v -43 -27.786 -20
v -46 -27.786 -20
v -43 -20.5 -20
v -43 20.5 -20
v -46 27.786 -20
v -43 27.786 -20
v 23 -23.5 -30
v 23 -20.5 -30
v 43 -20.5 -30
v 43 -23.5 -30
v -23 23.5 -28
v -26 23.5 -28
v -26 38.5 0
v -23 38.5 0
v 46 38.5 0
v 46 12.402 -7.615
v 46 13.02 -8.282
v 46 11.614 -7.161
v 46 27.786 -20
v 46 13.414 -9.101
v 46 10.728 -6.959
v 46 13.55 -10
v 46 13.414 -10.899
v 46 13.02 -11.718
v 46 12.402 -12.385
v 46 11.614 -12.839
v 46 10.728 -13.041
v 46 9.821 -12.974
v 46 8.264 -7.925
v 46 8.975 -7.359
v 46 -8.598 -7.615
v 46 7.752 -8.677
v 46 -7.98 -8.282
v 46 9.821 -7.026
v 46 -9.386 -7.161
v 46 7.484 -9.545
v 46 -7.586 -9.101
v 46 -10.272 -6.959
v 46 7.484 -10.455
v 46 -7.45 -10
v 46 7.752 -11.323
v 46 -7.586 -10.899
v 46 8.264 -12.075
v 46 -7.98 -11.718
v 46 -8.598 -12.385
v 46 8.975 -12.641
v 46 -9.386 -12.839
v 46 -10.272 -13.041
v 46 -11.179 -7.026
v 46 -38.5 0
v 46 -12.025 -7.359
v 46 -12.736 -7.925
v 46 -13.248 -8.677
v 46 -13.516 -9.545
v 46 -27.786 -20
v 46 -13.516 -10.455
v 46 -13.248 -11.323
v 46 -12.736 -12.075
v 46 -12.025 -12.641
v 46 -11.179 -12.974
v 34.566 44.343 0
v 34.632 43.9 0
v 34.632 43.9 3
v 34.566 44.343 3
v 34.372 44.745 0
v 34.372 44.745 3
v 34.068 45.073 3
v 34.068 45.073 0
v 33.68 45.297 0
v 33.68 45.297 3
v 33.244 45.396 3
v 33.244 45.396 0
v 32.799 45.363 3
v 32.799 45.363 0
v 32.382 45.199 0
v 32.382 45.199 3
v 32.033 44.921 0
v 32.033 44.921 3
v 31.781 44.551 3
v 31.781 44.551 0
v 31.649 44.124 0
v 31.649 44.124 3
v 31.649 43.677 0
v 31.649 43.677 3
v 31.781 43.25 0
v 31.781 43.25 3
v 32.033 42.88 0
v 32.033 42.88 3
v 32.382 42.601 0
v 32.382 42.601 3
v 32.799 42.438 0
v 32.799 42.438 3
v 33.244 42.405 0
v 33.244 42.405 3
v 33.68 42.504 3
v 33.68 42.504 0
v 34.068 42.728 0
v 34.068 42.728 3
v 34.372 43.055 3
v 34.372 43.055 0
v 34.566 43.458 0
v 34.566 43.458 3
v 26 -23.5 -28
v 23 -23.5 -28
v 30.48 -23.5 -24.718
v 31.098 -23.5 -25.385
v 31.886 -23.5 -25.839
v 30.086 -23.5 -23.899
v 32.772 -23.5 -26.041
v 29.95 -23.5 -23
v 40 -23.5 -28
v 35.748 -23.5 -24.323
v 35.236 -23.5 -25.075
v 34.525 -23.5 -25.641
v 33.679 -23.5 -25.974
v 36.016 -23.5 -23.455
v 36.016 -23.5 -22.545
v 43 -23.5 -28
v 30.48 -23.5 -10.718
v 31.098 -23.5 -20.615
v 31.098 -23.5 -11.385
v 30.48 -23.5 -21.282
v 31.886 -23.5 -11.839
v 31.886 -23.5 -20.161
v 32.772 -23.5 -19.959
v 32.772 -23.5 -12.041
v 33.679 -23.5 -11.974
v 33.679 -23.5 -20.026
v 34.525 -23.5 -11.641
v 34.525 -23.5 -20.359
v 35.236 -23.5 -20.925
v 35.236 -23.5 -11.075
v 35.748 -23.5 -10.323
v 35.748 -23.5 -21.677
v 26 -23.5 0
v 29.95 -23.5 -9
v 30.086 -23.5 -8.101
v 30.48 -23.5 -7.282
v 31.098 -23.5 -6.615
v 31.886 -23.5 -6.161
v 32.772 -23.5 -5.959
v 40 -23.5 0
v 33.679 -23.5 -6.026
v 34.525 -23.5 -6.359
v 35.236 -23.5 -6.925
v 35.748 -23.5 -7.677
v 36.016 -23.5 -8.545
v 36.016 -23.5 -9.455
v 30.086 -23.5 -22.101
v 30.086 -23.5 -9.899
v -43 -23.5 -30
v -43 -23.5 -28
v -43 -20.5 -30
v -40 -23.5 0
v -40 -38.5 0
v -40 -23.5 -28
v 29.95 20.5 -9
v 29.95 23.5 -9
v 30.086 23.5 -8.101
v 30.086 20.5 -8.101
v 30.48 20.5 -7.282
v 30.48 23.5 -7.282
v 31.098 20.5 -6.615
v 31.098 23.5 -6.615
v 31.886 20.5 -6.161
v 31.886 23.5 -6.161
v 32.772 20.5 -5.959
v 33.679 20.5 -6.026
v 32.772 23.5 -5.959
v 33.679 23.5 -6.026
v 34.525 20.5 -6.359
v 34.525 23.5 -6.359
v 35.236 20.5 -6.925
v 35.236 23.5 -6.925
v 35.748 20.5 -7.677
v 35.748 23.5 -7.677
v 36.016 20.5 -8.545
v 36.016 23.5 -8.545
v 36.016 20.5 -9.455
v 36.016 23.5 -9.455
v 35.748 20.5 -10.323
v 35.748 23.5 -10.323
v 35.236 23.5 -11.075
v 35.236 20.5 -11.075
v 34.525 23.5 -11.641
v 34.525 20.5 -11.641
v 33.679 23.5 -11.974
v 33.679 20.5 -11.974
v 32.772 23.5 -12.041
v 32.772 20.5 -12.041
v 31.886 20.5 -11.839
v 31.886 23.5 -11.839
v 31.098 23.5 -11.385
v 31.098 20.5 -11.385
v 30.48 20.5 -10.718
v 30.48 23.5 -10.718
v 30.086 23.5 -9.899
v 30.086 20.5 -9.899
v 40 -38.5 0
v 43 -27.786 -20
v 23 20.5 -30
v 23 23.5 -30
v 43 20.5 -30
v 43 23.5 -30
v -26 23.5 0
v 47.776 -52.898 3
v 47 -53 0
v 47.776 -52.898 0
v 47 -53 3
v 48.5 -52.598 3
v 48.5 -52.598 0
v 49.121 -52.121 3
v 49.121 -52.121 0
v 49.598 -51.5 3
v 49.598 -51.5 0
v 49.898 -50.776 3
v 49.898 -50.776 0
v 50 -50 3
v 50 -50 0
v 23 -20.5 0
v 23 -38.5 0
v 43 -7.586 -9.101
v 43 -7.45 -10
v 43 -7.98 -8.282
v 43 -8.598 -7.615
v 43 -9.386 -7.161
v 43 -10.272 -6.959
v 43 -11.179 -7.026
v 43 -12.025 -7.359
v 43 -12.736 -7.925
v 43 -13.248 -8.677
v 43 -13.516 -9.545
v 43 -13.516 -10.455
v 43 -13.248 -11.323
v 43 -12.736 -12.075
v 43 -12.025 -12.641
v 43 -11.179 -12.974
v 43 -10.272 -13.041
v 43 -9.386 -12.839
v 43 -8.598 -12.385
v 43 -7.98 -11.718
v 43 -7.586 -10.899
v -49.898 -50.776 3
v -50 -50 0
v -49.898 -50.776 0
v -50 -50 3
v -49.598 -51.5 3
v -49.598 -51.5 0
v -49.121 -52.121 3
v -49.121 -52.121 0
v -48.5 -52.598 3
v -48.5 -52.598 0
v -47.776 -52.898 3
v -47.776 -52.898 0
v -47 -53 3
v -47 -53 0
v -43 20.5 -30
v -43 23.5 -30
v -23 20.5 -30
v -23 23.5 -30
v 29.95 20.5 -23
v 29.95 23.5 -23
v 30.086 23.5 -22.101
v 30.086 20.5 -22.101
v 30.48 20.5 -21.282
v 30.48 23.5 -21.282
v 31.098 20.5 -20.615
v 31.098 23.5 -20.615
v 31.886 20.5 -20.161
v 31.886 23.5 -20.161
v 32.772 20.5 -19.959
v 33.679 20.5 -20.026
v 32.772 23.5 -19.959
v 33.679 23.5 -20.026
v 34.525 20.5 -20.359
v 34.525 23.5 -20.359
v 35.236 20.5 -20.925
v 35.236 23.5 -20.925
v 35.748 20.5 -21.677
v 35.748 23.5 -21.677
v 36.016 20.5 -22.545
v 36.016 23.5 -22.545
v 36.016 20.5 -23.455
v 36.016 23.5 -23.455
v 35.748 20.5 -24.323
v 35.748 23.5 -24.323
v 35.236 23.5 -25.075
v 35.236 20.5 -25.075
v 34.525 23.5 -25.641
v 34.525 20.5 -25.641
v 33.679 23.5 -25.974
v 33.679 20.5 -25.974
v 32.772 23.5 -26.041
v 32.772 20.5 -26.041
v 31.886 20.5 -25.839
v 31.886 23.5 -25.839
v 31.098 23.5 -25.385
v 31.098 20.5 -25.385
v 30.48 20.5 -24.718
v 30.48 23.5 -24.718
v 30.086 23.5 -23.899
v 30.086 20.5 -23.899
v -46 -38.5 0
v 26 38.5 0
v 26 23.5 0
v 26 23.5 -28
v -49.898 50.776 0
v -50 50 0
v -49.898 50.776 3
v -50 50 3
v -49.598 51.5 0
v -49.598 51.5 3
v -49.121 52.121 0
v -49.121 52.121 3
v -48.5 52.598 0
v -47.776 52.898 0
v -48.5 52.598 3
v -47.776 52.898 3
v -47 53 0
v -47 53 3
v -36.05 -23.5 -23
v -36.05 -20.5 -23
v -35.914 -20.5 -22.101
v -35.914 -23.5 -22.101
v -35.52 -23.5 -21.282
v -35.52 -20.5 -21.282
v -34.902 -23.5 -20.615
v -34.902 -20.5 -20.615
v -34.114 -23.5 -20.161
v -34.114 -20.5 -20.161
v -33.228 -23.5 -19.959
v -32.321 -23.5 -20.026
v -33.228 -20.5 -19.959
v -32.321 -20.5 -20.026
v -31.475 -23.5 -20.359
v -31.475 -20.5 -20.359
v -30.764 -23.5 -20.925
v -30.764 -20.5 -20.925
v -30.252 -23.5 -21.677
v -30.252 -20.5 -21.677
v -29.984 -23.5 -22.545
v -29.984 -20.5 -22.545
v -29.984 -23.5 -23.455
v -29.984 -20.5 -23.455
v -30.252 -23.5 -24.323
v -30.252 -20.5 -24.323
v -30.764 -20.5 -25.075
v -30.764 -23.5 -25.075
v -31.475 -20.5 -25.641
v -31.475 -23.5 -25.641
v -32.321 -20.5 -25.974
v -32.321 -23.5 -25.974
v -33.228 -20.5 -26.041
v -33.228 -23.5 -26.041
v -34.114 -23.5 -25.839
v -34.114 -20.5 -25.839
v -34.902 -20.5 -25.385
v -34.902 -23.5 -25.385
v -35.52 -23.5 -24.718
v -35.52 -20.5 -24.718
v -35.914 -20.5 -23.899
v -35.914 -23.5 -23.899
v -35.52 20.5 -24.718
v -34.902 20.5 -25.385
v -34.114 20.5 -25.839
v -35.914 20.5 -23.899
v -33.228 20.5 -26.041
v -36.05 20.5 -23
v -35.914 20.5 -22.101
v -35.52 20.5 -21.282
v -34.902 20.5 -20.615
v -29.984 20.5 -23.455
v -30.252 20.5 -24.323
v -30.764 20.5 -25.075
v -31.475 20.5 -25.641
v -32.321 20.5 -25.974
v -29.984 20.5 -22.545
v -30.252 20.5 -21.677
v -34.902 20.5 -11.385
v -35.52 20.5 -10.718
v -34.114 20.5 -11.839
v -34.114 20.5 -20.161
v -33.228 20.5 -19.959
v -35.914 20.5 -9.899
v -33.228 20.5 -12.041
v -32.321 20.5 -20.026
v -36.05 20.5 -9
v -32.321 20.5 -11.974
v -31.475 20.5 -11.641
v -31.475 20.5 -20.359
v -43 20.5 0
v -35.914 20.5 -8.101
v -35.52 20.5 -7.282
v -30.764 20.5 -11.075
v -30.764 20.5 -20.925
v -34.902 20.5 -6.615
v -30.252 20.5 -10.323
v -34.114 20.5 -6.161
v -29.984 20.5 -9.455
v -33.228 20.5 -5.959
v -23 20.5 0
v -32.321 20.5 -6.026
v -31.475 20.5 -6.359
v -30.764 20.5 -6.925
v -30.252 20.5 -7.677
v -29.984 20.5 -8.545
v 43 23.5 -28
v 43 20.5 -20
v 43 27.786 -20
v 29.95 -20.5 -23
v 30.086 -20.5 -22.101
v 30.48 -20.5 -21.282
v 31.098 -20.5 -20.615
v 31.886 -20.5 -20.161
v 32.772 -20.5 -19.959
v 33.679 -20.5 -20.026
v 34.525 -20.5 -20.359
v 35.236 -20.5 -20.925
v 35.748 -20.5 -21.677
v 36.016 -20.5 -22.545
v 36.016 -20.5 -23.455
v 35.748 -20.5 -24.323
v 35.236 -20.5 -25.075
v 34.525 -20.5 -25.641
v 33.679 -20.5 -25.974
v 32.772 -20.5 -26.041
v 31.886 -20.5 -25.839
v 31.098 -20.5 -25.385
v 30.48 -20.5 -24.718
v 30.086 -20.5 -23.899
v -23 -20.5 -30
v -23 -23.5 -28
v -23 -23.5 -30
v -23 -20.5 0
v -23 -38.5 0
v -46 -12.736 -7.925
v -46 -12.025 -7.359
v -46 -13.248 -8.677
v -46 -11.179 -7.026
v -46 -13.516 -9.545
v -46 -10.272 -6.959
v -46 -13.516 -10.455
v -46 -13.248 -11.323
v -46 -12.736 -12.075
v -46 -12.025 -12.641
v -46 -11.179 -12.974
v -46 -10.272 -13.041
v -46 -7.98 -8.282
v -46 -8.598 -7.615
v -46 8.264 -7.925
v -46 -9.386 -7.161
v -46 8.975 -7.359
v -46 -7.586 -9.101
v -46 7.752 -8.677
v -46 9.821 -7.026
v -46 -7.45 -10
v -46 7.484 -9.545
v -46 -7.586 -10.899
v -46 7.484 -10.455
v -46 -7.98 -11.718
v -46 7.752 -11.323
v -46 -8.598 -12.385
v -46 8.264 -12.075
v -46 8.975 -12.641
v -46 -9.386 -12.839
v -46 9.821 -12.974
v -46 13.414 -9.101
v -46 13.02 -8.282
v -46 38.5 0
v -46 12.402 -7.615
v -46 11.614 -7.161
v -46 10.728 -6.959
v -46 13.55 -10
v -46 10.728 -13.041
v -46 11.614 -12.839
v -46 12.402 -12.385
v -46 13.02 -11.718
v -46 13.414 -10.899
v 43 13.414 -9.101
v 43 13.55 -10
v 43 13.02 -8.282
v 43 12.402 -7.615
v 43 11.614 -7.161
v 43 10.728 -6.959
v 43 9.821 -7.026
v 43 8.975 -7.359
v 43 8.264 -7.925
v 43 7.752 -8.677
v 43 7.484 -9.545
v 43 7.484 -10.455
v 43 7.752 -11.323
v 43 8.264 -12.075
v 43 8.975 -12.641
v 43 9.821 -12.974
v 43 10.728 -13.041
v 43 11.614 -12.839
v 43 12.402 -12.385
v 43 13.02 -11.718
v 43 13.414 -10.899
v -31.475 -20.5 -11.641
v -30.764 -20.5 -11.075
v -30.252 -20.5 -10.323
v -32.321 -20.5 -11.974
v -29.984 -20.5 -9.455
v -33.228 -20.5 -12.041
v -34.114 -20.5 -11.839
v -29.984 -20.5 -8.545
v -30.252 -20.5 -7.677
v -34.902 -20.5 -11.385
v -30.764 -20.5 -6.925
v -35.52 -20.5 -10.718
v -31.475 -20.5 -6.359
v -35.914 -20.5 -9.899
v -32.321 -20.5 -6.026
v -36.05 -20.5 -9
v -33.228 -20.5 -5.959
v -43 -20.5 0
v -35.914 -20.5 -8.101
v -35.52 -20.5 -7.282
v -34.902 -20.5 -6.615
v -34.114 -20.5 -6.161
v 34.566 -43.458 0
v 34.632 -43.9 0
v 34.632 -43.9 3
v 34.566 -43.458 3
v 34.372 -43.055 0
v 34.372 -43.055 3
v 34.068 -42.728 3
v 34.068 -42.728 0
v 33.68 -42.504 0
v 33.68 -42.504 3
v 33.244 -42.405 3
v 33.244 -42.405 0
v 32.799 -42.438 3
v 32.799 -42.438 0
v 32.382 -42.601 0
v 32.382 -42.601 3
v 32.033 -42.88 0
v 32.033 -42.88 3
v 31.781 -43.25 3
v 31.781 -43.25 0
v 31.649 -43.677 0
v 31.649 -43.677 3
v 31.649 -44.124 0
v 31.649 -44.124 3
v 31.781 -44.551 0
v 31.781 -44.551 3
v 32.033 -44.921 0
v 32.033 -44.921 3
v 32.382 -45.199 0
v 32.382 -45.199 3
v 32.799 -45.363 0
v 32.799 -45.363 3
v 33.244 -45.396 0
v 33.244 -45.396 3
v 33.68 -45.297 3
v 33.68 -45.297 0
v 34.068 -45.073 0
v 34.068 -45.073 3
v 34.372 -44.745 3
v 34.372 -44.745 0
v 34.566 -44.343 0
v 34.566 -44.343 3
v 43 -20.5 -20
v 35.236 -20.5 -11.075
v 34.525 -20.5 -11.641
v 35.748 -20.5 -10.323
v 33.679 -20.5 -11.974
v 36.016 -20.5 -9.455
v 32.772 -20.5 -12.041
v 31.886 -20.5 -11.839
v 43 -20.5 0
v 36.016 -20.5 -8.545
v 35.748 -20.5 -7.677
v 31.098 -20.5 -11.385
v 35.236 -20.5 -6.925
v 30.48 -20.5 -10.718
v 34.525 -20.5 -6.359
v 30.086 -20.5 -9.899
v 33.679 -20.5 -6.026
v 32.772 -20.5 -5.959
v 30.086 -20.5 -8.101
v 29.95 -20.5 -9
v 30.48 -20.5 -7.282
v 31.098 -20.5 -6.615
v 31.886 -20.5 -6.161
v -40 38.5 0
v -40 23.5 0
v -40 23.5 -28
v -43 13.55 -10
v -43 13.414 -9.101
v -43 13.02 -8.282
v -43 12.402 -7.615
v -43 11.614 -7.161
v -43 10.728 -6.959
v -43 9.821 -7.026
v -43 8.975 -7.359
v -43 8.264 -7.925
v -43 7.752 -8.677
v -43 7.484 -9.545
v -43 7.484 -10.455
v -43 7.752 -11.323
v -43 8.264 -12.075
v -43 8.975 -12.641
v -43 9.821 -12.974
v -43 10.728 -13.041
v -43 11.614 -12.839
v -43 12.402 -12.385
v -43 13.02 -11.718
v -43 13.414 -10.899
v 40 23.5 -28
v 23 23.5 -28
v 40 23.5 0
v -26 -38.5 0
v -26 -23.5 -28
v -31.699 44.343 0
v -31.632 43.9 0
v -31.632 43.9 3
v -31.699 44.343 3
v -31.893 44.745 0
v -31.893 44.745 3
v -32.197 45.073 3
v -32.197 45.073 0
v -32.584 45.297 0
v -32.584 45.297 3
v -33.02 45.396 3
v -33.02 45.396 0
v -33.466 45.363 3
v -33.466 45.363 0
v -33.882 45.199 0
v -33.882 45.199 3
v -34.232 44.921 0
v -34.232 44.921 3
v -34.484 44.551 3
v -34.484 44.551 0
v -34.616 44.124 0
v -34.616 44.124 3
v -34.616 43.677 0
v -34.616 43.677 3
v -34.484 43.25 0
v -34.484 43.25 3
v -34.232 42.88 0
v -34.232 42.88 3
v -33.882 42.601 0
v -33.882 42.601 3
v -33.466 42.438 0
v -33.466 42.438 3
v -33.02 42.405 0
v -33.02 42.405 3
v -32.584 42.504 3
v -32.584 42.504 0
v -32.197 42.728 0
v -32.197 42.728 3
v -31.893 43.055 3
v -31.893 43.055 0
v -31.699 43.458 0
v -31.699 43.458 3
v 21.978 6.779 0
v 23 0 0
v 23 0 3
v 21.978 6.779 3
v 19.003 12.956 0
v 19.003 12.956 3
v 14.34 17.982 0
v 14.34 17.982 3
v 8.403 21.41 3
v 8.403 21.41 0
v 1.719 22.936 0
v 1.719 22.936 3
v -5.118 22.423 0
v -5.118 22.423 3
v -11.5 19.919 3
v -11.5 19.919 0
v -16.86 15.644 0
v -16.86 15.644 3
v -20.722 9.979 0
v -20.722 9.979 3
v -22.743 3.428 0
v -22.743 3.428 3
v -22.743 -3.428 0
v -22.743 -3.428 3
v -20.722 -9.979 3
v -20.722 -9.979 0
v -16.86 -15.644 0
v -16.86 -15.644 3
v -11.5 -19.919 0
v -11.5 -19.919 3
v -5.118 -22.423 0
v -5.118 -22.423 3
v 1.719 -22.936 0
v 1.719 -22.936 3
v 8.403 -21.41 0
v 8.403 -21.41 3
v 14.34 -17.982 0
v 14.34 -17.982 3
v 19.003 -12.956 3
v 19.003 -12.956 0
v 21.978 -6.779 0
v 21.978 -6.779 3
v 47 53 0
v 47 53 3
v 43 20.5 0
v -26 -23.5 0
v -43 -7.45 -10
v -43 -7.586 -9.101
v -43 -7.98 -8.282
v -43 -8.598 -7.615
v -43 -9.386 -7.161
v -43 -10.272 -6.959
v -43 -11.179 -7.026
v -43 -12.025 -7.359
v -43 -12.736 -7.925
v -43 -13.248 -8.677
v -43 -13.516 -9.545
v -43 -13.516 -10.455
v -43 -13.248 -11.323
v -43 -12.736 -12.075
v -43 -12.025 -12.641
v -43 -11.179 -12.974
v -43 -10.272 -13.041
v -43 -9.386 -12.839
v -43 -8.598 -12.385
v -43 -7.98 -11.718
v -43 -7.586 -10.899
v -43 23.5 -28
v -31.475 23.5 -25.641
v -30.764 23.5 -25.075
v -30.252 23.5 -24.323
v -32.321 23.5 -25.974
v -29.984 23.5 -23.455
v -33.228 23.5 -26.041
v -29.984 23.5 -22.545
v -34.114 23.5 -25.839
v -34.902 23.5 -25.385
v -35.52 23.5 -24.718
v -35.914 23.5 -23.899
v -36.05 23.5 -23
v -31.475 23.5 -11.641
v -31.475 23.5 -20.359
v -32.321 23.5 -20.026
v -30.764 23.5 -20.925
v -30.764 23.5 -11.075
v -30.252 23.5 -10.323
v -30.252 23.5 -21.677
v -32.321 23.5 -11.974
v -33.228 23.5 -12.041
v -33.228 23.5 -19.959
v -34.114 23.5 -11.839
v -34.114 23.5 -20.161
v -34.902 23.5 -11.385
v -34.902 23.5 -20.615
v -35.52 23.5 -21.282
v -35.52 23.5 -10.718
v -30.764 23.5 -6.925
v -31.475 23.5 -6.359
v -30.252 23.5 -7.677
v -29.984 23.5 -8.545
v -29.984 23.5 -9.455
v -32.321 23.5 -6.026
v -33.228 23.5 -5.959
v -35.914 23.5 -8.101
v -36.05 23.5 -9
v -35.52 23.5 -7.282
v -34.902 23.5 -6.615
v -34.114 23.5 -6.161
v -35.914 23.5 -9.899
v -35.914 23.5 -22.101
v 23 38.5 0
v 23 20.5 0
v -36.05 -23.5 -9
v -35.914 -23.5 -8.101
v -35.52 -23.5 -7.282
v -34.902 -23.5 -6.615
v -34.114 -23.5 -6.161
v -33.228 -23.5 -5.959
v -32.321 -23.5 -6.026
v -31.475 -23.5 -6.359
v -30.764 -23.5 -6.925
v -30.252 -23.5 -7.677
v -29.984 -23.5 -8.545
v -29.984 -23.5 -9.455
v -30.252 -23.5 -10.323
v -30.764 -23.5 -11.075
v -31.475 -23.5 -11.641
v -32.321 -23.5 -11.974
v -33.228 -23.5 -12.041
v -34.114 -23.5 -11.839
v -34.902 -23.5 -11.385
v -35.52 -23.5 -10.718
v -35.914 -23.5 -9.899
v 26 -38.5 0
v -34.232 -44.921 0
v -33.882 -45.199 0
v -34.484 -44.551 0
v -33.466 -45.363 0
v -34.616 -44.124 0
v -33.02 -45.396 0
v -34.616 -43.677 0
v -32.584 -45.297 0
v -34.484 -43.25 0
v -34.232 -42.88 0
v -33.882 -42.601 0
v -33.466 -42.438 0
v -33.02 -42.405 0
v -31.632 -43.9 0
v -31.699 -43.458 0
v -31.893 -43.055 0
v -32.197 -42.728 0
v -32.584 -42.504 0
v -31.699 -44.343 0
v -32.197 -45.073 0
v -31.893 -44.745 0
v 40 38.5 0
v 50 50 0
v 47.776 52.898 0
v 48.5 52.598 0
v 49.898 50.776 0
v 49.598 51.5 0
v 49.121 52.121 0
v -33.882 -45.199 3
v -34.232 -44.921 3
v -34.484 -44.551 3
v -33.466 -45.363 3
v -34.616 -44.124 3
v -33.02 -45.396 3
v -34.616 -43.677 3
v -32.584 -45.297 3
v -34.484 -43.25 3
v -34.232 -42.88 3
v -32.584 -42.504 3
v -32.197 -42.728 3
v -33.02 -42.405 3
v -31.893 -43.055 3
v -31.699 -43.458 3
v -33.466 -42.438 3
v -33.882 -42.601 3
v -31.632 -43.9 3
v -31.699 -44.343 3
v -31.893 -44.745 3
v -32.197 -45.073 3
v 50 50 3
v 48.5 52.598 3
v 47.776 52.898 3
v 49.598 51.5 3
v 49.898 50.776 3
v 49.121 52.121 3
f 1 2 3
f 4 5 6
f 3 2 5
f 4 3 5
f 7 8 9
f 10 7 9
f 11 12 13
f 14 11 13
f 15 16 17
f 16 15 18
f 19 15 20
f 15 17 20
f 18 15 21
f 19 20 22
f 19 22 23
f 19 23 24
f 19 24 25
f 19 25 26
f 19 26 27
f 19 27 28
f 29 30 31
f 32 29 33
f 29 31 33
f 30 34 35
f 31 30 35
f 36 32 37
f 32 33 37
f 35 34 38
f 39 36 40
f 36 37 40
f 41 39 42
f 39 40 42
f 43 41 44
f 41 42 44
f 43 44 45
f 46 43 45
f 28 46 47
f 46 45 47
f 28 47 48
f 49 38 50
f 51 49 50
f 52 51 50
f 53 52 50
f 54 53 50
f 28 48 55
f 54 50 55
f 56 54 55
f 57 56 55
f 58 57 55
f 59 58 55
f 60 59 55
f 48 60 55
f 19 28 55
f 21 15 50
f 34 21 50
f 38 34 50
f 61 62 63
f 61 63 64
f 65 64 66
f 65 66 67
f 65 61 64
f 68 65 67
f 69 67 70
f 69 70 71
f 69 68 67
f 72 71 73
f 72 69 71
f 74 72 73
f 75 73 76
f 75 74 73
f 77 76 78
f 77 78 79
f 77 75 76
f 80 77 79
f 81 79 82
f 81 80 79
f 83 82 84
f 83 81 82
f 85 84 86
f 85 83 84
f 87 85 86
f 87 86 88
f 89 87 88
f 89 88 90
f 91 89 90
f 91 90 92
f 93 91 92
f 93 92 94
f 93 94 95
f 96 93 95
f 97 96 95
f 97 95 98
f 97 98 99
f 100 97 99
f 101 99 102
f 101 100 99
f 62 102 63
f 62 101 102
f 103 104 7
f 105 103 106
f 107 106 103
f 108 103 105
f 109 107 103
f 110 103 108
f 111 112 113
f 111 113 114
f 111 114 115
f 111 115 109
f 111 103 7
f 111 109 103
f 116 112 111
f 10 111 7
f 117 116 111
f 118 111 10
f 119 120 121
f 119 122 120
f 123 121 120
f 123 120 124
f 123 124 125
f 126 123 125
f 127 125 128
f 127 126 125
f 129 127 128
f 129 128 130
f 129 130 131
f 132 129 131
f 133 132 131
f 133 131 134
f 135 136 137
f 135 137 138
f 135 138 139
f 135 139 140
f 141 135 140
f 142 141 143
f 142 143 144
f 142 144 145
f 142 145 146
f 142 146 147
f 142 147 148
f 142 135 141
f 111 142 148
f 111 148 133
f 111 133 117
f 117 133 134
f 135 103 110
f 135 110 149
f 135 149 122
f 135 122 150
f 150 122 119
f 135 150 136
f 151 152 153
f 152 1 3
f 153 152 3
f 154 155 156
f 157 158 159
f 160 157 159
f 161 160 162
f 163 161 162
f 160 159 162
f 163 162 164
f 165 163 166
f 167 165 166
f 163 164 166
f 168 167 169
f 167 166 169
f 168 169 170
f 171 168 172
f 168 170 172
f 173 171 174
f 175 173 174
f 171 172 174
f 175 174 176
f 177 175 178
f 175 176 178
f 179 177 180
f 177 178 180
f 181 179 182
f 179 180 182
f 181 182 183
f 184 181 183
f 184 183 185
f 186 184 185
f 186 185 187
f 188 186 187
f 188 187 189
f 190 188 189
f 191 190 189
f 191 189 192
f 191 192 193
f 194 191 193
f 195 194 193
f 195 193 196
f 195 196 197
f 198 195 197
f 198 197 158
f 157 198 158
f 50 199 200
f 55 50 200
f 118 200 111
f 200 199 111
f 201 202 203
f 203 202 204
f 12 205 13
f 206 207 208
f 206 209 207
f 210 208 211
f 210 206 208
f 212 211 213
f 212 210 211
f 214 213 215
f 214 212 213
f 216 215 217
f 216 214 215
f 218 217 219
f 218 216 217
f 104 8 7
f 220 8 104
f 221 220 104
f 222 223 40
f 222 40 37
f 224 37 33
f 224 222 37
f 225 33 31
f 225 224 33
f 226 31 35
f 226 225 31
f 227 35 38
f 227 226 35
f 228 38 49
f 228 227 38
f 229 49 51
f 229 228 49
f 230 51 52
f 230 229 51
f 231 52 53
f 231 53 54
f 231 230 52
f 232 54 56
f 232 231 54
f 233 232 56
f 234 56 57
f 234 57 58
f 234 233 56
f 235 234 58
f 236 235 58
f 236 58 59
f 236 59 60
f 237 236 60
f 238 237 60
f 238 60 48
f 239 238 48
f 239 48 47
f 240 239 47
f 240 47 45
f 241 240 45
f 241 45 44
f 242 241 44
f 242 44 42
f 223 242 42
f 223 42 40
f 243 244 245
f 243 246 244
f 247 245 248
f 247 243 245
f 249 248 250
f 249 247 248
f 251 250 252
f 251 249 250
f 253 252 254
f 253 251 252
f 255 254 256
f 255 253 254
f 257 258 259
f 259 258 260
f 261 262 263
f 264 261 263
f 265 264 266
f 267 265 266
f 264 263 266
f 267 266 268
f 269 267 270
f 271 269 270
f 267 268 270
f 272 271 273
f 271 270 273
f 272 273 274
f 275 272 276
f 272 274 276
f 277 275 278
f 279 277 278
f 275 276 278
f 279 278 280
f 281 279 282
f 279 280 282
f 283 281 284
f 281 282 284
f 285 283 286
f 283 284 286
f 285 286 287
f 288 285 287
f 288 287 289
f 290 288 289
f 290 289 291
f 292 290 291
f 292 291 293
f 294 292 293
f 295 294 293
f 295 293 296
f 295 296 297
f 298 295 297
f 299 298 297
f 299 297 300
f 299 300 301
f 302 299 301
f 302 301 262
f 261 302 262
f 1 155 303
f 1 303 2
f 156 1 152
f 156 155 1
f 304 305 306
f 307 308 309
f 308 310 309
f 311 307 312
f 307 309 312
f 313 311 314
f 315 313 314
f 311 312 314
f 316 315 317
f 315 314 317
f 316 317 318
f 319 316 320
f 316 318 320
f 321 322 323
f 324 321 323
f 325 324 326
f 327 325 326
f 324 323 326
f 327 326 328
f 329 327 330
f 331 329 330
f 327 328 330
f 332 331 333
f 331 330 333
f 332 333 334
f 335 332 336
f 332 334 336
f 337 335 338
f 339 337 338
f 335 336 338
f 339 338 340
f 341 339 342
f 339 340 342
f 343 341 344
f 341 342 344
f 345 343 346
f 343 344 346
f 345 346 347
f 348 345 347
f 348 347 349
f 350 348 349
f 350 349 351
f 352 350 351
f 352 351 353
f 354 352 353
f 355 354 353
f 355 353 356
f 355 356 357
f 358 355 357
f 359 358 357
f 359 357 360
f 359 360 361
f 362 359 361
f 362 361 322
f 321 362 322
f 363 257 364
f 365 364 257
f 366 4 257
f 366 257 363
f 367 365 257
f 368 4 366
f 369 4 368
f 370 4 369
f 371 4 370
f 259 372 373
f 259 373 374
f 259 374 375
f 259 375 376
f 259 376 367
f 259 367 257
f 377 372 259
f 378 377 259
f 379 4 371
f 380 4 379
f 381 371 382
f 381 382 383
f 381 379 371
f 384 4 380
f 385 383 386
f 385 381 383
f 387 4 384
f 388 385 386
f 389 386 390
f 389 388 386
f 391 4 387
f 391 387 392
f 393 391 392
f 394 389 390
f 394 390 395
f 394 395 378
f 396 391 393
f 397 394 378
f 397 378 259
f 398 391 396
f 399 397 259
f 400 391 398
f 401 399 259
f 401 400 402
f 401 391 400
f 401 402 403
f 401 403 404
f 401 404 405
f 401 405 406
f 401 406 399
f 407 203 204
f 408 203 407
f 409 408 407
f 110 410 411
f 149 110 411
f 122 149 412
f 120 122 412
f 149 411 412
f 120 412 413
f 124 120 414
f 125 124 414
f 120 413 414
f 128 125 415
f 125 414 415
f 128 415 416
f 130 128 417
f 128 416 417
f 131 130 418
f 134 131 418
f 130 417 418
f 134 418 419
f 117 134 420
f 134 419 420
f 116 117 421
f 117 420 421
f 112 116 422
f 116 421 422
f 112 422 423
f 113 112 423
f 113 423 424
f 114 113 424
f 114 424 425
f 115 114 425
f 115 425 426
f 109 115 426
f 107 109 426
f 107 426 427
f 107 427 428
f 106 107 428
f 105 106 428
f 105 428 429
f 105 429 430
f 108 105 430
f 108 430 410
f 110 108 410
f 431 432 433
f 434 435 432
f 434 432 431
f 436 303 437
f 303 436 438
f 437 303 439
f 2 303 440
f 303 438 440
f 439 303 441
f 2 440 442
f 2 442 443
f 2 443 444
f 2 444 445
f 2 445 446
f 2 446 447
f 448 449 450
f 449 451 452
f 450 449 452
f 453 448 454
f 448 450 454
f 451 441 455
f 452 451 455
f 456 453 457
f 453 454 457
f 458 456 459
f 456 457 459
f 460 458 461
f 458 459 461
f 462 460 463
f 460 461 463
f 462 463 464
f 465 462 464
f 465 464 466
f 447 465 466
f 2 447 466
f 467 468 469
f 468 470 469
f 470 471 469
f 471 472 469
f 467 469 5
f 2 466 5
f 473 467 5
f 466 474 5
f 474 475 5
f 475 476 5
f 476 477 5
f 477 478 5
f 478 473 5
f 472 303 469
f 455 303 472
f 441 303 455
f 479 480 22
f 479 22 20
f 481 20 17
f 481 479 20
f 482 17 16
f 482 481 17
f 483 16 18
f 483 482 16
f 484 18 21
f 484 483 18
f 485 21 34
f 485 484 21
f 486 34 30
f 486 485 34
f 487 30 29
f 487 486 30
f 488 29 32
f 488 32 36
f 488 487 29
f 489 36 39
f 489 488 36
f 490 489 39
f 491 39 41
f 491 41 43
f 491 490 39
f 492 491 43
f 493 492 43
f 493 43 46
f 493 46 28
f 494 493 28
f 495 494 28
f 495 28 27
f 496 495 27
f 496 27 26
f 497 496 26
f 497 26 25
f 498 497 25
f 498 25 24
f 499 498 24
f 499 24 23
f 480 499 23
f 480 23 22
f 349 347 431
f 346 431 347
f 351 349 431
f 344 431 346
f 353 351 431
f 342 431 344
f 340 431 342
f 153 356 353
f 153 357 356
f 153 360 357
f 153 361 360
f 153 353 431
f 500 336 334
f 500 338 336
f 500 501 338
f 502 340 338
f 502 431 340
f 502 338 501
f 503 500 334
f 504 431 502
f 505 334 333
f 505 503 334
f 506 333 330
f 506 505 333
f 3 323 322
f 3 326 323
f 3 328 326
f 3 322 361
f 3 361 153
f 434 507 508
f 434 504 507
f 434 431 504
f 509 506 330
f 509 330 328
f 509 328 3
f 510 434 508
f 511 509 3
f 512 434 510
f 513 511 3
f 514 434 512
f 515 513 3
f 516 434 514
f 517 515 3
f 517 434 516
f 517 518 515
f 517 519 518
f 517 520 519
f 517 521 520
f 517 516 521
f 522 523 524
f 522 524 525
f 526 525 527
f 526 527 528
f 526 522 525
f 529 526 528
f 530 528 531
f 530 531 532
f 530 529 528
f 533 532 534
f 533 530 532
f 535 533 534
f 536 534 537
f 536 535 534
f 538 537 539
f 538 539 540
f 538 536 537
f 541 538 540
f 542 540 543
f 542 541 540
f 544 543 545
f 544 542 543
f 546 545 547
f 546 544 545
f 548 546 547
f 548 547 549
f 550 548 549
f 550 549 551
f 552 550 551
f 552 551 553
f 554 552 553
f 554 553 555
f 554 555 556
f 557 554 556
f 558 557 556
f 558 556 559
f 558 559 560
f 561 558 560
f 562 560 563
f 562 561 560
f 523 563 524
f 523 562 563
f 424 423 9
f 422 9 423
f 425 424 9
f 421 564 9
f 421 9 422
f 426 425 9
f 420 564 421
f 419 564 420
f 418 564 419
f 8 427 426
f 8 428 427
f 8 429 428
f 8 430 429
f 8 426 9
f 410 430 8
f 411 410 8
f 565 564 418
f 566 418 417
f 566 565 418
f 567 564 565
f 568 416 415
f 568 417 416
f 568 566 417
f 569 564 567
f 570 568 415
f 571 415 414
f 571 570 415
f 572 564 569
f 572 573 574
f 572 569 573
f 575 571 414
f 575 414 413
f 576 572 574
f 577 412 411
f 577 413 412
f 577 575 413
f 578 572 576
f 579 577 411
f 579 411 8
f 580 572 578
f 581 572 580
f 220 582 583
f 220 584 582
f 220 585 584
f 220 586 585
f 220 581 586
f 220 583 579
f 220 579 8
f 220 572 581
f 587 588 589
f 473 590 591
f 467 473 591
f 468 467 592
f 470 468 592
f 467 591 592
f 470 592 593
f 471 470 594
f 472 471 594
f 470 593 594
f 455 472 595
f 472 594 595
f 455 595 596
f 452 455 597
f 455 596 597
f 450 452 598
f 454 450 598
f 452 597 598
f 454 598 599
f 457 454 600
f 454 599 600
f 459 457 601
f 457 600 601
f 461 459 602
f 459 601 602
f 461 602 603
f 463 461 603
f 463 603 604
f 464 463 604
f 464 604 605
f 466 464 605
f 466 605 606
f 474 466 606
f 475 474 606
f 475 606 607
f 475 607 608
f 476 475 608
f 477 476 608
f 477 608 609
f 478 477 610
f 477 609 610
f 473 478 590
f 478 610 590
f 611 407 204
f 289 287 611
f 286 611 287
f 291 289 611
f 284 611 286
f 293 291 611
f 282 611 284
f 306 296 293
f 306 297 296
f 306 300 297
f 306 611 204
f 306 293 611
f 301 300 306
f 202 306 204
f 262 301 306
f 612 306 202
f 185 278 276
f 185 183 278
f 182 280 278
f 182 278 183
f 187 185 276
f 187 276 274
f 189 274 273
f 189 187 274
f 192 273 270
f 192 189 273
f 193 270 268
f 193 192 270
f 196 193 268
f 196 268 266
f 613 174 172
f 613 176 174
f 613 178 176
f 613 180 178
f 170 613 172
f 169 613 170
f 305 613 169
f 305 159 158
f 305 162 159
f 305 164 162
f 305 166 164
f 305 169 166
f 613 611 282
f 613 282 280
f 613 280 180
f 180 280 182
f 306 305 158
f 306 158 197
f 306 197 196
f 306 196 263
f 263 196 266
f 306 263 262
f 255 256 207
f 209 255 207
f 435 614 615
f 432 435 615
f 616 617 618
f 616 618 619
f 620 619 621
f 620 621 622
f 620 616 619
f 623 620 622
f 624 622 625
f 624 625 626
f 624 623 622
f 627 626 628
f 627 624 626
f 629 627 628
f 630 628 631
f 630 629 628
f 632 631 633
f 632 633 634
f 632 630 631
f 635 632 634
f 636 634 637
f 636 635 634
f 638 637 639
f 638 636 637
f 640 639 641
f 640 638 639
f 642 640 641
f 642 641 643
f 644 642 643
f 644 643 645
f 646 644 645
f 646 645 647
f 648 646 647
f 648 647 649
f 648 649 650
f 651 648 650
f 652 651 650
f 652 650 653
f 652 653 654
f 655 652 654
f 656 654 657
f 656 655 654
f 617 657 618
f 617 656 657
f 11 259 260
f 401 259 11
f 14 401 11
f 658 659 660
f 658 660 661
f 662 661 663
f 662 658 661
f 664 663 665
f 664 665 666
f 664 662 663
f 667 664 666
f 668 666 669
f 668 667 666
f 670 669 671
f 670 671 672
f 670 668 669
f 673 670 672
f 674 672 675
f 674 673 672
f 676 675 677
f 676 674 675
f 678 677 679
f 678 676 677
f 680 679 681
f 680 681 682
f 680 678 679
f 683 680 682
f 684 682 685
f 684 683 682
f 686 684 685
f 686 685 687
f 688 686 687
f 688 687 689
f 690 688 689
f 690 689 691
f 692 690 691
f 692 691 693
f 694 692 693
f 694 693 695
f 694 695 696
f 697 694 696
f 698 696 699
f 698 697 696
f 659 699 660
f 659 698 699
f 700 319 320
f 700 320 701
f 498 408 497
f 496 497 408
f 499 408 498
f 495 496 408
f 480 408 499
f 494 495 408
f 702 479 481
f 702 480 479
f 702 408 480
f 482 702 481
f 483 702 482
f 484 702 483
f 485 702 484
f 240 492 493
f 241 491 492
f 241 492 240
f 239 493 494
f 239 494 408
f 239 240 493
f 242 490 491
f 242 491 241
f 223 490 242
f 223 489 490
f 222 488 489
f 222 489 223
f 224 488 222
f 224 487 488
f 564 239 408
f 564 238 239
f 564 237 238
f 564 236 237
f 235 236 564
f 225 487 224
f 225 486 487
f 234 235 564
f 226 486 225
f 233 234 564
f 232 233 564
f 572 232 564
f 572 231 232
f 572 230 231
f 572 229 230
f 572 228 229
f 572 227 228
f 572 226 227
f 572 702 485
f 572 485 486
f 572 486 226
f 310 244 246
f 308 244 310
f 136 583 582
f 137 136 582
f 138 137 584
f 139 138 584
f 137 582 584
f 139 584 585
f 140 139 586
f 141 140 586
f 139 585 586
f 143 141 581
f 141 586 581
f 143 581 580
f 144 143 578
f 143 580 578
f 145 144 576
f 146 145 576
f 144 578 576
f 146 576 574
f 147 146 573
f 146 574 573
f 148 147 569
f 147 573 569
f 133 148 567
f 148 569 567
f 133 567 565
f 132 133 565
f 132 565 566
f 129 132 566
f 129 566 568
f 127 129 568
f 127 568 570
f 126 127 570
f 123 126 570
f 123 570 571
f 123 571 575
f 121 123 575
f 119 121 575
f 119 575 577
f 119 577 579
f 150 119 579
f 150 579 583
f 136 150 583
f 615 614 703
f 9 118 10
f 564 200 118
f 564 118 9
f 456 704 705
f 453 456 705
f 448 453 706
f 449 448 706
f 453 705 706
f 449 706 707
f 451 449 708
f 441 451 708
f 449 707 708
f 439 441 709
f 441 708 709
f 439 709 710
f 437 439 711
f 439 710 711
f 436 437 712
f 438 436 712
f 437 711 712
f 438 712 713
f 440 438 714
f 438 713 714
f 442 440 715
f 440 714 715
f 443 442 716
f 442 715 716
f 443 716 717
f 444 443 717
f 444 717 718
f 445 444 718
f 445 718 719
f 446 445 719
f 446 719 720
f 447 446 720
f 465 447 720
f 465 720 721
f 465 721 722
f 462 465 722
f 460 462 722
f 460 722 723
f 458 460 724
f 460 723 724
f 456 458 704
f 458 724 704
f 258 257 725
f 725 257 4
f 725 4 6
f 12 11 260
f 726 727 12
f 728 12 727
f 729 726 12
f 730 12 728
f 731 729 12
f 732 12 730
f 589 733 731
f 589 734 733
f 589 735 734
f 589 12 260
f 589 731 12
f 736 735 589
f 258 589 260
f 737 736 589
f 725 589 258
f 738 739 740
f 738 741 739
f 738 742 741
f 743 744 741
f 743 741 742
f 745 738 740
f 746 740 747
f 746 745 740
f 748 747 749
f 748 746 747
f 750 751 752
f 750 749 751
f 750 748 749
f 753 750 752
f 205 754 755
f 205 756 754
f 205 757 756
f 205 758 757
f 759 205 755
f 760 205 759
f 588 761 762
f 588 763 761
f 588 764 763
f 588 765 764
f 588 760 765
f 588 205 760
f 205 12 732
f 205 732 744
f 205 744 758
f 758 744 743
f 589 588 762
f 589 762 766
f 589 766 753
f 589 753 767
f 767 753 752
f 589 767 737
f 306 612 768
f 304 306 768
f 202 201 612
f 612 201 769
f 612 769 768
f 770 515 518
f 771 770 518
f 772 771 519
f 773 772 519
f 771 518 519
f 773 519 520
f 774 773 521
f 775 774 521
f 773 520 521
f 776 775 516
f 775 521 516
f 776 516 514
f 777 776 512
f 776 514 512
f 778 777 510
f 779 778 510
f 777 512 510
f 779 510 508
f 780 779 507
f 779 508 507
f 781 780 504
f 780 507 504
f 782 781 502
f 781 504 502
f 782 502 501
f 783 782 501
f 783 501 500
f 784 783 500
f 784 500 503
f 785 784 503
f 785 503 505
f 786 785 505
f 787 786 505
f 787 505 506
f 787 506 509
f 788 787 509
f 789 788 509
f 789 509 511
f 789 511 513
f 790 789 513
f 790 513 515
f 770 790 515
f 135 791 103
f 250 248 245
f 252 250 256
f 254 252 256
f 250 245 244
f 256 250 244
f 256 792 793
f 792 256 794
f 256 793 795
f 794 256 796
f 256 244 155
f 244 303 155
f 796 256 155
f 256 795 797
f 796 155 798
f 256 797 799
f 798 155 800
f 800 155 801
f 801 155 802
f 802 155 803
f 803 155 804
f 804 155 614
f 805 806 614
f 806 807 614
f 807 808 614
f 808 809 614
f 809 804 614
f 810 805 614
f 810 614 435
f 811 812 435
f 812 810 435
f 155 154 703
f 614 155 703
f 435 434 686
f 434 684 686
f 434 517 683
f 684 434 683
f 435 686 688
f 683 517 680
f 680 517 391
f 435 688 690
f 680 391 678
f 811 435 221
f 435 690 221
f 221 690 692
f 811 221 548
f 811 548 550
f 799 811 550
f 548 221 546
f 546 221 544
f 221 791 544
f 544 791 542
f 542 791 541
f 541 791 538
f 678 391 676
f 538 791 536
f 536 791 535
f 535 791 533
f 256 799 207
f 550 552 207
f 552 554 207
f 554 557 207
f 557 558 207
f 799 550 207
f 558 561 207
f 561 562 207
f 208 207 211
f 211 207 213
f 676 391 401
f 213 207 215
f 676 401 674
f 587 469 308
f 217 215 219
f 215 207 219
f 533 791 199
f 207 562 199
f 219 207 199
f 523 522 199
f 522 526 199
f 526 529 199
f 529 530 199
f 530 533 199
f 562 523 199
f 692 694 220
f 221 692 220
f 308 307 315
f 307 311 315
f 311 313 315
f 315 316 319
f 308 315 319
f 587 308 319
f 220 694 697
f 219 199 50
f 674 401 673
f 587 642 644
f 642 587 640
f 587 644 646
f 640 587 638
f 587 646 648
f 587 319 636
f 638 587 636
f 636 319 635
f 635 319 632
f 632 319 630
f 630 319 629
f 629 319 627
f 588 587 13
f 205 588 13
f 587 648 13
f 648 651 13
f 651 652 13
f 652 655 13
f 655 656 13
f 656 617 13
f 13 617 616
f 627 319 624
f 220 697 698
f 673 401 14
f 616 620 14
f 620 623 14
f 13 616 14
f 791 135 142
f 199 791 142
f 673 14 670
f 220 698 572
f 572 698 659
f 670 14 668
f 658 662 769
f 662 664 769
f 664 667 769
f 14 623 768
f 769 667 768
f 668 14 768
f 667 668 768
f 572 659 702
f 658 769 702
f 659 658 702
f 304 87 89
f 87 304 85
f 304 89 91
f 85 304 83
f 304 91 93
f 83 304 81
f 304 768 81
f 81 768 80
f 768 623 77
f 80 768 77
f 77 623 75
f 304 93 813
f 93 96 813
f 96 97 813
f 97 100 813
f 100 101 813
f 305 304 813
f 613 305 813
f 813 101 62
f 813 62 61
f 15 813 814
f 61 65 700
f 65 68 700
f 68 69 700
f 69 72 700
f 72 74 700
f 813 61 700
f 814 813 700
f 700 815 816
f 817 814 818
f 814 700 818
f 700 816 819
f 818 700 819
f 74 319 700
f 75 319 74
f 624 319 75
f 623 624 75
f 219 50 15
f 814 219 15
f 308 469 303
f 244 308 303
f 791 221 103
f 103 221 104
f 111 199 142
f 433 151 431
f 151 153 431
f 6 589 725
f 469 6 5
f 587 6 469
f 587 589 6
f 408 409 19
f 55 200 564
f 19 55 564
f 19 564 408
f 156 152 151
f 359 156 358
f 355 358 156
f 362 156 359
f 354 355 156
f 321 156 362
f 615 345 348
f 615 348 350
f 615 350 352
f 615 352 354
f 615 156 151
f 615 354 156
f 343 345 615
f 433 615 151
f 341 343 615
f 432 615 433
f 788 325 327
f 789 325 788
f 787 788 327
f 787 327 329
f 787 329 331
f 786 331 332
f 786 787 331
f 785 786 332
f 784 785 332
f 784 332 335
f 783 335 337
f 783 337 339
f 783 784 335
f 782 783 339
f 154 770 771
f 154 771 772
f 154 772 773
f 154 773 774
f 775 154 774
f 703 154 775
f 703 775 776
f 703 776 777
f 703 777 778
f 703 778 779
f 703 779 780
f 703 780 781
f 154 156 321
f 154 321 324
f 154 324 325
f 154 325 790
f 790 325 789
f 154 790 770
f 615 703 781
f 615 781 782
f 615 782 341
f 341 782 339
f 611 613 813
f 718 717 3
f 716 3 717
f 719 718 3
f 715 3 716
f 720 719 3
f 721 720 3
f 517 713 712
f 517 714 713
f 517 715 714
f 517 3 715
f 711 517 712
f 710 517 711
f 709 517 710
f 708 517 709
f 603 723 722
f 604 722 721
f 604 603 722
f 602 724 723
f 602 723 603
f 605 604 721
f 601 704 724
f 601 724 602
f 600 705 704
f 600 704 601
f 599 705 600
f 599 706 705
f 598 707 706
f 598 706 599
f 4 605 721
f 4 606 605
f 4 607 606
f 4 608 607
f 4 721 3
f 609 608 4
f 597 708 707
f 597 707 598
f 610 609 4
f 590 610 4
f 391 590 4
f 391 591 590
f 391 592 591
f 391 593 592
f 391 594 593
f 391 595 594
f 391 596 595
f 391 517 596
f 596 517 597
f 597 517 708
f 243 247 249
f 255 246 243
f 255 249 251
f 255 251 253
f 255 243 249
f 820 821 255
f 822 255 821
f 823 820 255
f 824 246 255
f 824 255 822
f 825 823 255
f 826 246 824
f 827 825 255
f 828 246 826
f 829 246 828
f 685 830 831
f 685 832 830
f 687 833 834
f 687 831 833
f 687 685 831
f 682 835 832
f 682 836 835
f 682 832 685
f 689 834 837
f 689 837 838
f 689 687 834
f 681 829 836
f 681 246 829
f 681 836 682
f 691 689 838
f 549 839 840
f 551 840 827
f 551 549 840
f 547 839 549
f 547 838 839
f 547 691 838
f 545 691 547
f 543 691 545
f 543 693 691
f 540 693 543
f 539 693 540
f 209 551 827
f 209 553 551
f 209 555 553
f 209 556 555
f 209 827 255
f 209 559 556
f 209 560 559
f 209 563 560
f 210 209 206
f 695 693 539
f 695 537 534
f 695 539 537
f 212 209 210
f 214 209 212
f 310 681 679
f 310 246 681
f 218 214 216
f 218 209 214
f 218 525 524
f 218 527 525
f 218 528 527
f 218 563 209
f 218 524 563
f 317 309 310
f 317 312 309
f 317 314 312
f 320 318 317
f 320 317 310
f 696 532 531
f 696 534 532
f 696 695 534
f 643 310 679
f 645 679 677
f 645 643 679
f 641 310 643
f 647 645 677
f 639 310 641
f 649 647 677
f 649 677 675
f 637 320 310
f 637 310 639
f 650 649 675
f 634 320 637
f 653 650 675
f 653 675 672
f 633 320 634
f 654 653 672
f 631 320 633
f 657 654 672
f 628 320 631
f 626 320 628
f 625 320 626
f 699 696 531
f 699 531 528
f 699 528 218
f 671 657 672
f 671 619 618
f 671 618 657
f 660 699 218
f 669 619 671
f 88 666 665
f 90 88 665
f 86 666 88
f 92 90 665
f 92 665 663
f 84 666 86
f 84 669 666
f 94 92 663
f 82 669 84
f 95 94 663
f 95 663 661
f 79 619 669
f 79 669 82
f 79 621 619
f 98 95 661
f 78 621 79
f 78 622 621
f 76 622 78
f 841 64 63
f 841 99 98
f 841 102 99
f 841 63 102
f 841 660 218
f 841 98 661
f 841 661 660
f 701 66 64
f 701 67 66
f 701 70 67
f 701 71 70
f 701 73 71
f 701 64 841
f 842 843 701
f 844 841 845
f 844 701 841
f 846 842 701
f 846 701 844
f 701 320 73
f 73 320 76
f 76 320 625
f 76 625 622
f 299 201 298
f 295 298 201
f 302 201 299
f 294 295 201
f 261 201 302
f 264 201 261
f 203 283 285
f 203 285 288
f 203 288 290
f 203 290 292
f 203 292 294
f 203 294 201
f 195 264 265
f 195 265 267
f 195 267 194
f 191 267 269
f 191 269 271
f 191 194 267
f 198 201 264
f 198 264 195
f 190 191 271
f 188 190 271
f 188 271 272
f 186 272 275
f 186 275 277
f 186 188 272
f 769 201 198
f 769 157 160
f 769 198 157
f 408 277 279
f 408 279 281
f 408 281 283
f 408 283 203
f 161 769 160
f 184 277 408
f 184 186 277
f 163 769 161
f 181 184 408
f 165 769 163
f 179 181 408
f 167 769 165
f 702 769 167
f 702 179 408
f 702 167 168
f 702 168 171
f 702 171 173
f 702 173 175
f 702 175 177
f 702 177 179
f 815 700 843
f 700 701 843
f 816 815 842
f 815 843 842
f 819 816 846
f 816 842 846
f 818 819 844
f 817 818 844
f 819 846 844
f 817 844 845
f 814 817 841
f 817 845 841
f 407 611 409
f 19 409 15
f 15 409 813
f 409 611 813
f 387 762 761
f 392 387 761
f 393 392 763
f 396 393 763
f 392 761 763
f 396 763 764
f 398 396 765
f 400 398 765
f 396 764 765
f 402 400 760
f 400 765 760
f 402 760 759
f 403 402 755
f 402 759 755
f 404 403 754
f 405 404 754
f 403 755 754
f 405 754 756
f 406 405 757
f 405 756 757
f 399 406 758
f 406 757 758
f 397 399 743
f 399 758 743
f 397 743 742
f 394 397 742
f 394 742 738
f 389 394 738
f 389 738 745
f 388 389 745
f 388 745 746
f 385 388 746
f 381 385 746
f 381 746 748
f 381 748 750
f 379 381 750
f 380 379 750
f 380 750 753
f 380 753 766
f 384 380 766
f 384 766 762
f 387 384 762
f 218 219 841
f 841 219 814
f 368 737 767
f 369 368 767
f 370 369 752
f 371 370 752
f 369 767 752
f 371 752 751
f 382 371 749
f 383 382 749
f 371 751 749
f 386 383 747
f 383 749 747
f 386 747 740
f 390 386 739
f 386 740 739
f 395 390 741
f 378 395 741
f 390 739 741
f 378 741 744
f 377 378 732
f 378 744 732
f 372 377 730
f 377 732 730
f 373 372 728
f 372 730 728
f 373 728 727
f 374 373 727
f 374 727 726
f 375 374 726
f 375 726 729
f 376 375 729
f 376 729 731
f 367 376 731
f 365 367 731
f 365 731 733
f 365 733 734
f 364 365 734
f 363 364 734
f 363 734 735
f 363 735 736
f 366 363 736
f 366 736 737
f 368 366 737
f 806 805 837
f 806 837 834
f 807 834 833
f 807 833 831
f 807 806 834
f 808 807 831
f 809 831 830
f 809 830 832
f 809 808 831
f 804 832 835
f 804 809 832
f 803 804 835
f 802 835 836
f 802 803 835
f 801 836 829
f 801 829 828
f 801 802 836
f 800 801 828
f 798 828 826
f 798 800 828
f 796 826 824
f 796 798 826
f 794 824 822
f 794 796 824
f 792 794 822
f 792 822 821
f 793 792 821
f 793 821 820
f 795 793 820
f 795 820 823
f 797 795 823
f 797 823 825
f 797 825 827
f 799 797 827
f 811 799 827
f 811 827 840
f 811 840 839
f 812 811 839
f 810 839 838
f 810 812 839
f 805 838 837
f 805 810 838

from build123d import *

# Parameters (mm, degrees)
F0_W           = 100
F0_H           = 106
F0_R           = 1.5
F0_R_2         = 23
F1_DEPTH       = 3
F2_R           = 3
F4_DEPTH       = 28
F5_DEPTH       = 20
F3_W           = 3
F3_H           = 15
F6_DEPTH       = 28
F7_DEPTH       = 15
F7_DEPTH_BACK  = 62
F9_DEPTH       = 20
F9_DEPTH_BACK  = 72
F11_DEPTH      = 20
F11_DEPTH_BACK = 72
F12_R          = 3.05
F13_R          = 3.05
F14_DEPTH      = 47
F15_R          = 3.05
F16_DEPTH      = 3
F16_DEPTH_BACK = 89
F17_DEPTH      = 2


with BuildPart() as f1:
    # F0 (on Top) → F1 (new body)
    with BuildSketch(Plane.XY):
        Rectangle(F0_W, F0_H)
        with Locations((-33.1323798252, -43.9004032683)):
            Circle(F0_R, mode=Mode.SUBTRACT)
        with Locations((33.1323798252, -43.9004032683)):
            Circle(F0_R, mode=Mode.SUBTRACT)
        with Locations((-33.1323798252, 43.9004032683)):
            Circle(F0_R, mode=Mode.SUBTRACT)
        Circle(F0_R_2, mode=Mode.SUBTRACT)
        with Locations((33.1323798252, 43.9004032683)):
            Circle(F0_R, mode=Mode.SUBTRACT)
    extrude(amount=F1_DEPTH)

    # F2
    f2_edges = [f1.edges().sort_by_distance(p)[0] for p in [
        (-50, -53, 1.5),
        (-50, 53, 1.5),
        (50, 53, 1.5),
        (50, -53, 1.5),
    ]]
    fillet(f2_edges, radius=F2_R)

    # F3 (on Top) → F4 (join)
    with BuildSketch(Plane.XY):
        Polygon((-23, -20.5), (-43, -20.5), (-43, -23.5), (-40, -23.5), (-26, -23.5), (-23, -23.5), align=None)
        Polygon((-43, 23.5), (-43, 20.5), (-23, 20.5), (-23, 23.5), (-26, 23.5), (-40, 23.5), align=None)
        Polygon((23, 20.5), (43, 20.5), (43, 23.5), (40, 23.5), (26, 23.5), (23, 23.5), align=None)
        Polygon((43, -23.5), (43, -20.5), (23, -20.5), (23, -23.5), (26, -23.5), (40, -23.5), align=None)
    extrude(amount=-F4_DEPTH)

    # F3 (on Top) → F5 (join)
    with BuildSketch(Plane.XY):
        Polygon((43, 20.5), (43, -20.5), (43, -23.5), (46, -23.5), (46, 23.5), (43, 23.5), align=None)
        Polygon((-43, -20.5), (-43, 20.5), (-43, 23.5), (-46, 23.5), (-46, -23.5), (-43, -23.5), align=None)
    extrude(amount=-F5_DEPTH)

    # F3 (on Top) → F6 (join)
    with BuildSketch(Plane.XY):
        with Locations((-41.5, 31)):
            Rectangle(F3_W, F3_H)
        with Locations((-24.5, 31)):
            Rectangle(F3_W, F3_H)
        with Locations((24.5, 31)):
            Rectangle(F3_W, F3_H)
        with Locations((41.5, 31)):
            Rectangle(F3_W, F3_H)
        with Locations((-41.5, -31)):
            Rectangle(F3_W, F3_H)
        with Locations((-24.5, -31)):
            Rectangle(F3_W, F3_H)
        with Locations((24.5, -31)):
            Rectangle(F3_W, F3_H)
        with Locations((41.5, -31)):
            Rectangle(F3_W, F3_H)
    extrude(amount=-F6_DEPTH)

    # F7 (add, two sides): faces of the model
    f7_faces = [f1.faces().sort_by_distance(p)[0] for p in [
        (-44.5, -23.5, -10),
        (44.5, -23.5, -10),
    ]]
    extrude(f7_faces, amount=F7_DEPTH)
    extrude(f7_faces, amount=-F7_DEPTH_BACK)

    # F8 (on face) → F9 (cut, two sides)
    with BuildSketch(Plane(origin=(-26, 0, 0), x_dir=(0, -1, 0), z_dir=(-1, 0, 0))) as f9_sk:
        Polygon((-23.5, -28), (-38.5, 0), (-38.5, -28), align=None)
    extrude(amount=F9_DEPTH, mode=Mode.SUBTRACT)
    extrude(f9_sk.sketch, amount=-F9_DEPTH_BACK, mode=Mode.SUBTRACT)

    # F10 (on face) → F11 (cut, two sides)
    with BuildSketch(Plane(origin=(-26, 0, 0), x_dir=(0, -1, 0), z_dir=(-1, 0, 0))) as f11_sk:
        Polygon((38.5, 0), (23.5, -28), (38.5, -28), align=None)
    extrude(amount=F11_DEPTH, mode=Mode.SUBTRACT)
    extrude(f11_sk.sketch, amount=-F11_DEPTH_BACK, mode=Mode.SUBTRACT)

    # F12 (on face) + F13 (on face) → F14 (cut, through all)
    with BuildSketch(Plane(origin=(0, 23.5, 0), x_dir=(-1, 0, 0), z_dir=(0, 1, 0))):
        with Locations((33, -23)):
            Circle(F12_R)
        with Locations((33, -9)):
            Circle(F12_R)
    with BuildSketch(Plane(origin=(0, 23.5, 0), x_dir=(-1, 0, 0), z_dir=(0, 1, 0))):
        with Locations((-33, -9)):
            Circle(F13_R)
        with Locations((-33, -23)):
            Circle(F13_R)
    extrude(amount=-F14_DEPTH, mode=Mode.SUBTRACT)

    # F15 (on face) → F16 (cut, two sides)
    with BuildSketch(Plane.YZ.offset(-43)) as f16_sk:
        with Locations((10.5, -10)):
            Circle(F15_R)
        with Locations((-10.5, -10)):
            Circle(F15_R)
    extrude(amount=-F16_DEPTH, mode=Mode.SUBTRACT)
    extrude(f16_sk.sketch, amount=F16_DEPTH_BACK, mode=Mode.SUBTRACT)

    # F17 (add): faces of the model
    f17_faces = [f1.faces().sort_by_distance(p)[0] for p in [
        (33, -22, -28),
        (-33, -22, -28),
        (-33, 22, -28),
        (33, 22, -28),
    ]]
    extrude(f17_faces, amount=F17_DEPTH)


solid = f1.part
